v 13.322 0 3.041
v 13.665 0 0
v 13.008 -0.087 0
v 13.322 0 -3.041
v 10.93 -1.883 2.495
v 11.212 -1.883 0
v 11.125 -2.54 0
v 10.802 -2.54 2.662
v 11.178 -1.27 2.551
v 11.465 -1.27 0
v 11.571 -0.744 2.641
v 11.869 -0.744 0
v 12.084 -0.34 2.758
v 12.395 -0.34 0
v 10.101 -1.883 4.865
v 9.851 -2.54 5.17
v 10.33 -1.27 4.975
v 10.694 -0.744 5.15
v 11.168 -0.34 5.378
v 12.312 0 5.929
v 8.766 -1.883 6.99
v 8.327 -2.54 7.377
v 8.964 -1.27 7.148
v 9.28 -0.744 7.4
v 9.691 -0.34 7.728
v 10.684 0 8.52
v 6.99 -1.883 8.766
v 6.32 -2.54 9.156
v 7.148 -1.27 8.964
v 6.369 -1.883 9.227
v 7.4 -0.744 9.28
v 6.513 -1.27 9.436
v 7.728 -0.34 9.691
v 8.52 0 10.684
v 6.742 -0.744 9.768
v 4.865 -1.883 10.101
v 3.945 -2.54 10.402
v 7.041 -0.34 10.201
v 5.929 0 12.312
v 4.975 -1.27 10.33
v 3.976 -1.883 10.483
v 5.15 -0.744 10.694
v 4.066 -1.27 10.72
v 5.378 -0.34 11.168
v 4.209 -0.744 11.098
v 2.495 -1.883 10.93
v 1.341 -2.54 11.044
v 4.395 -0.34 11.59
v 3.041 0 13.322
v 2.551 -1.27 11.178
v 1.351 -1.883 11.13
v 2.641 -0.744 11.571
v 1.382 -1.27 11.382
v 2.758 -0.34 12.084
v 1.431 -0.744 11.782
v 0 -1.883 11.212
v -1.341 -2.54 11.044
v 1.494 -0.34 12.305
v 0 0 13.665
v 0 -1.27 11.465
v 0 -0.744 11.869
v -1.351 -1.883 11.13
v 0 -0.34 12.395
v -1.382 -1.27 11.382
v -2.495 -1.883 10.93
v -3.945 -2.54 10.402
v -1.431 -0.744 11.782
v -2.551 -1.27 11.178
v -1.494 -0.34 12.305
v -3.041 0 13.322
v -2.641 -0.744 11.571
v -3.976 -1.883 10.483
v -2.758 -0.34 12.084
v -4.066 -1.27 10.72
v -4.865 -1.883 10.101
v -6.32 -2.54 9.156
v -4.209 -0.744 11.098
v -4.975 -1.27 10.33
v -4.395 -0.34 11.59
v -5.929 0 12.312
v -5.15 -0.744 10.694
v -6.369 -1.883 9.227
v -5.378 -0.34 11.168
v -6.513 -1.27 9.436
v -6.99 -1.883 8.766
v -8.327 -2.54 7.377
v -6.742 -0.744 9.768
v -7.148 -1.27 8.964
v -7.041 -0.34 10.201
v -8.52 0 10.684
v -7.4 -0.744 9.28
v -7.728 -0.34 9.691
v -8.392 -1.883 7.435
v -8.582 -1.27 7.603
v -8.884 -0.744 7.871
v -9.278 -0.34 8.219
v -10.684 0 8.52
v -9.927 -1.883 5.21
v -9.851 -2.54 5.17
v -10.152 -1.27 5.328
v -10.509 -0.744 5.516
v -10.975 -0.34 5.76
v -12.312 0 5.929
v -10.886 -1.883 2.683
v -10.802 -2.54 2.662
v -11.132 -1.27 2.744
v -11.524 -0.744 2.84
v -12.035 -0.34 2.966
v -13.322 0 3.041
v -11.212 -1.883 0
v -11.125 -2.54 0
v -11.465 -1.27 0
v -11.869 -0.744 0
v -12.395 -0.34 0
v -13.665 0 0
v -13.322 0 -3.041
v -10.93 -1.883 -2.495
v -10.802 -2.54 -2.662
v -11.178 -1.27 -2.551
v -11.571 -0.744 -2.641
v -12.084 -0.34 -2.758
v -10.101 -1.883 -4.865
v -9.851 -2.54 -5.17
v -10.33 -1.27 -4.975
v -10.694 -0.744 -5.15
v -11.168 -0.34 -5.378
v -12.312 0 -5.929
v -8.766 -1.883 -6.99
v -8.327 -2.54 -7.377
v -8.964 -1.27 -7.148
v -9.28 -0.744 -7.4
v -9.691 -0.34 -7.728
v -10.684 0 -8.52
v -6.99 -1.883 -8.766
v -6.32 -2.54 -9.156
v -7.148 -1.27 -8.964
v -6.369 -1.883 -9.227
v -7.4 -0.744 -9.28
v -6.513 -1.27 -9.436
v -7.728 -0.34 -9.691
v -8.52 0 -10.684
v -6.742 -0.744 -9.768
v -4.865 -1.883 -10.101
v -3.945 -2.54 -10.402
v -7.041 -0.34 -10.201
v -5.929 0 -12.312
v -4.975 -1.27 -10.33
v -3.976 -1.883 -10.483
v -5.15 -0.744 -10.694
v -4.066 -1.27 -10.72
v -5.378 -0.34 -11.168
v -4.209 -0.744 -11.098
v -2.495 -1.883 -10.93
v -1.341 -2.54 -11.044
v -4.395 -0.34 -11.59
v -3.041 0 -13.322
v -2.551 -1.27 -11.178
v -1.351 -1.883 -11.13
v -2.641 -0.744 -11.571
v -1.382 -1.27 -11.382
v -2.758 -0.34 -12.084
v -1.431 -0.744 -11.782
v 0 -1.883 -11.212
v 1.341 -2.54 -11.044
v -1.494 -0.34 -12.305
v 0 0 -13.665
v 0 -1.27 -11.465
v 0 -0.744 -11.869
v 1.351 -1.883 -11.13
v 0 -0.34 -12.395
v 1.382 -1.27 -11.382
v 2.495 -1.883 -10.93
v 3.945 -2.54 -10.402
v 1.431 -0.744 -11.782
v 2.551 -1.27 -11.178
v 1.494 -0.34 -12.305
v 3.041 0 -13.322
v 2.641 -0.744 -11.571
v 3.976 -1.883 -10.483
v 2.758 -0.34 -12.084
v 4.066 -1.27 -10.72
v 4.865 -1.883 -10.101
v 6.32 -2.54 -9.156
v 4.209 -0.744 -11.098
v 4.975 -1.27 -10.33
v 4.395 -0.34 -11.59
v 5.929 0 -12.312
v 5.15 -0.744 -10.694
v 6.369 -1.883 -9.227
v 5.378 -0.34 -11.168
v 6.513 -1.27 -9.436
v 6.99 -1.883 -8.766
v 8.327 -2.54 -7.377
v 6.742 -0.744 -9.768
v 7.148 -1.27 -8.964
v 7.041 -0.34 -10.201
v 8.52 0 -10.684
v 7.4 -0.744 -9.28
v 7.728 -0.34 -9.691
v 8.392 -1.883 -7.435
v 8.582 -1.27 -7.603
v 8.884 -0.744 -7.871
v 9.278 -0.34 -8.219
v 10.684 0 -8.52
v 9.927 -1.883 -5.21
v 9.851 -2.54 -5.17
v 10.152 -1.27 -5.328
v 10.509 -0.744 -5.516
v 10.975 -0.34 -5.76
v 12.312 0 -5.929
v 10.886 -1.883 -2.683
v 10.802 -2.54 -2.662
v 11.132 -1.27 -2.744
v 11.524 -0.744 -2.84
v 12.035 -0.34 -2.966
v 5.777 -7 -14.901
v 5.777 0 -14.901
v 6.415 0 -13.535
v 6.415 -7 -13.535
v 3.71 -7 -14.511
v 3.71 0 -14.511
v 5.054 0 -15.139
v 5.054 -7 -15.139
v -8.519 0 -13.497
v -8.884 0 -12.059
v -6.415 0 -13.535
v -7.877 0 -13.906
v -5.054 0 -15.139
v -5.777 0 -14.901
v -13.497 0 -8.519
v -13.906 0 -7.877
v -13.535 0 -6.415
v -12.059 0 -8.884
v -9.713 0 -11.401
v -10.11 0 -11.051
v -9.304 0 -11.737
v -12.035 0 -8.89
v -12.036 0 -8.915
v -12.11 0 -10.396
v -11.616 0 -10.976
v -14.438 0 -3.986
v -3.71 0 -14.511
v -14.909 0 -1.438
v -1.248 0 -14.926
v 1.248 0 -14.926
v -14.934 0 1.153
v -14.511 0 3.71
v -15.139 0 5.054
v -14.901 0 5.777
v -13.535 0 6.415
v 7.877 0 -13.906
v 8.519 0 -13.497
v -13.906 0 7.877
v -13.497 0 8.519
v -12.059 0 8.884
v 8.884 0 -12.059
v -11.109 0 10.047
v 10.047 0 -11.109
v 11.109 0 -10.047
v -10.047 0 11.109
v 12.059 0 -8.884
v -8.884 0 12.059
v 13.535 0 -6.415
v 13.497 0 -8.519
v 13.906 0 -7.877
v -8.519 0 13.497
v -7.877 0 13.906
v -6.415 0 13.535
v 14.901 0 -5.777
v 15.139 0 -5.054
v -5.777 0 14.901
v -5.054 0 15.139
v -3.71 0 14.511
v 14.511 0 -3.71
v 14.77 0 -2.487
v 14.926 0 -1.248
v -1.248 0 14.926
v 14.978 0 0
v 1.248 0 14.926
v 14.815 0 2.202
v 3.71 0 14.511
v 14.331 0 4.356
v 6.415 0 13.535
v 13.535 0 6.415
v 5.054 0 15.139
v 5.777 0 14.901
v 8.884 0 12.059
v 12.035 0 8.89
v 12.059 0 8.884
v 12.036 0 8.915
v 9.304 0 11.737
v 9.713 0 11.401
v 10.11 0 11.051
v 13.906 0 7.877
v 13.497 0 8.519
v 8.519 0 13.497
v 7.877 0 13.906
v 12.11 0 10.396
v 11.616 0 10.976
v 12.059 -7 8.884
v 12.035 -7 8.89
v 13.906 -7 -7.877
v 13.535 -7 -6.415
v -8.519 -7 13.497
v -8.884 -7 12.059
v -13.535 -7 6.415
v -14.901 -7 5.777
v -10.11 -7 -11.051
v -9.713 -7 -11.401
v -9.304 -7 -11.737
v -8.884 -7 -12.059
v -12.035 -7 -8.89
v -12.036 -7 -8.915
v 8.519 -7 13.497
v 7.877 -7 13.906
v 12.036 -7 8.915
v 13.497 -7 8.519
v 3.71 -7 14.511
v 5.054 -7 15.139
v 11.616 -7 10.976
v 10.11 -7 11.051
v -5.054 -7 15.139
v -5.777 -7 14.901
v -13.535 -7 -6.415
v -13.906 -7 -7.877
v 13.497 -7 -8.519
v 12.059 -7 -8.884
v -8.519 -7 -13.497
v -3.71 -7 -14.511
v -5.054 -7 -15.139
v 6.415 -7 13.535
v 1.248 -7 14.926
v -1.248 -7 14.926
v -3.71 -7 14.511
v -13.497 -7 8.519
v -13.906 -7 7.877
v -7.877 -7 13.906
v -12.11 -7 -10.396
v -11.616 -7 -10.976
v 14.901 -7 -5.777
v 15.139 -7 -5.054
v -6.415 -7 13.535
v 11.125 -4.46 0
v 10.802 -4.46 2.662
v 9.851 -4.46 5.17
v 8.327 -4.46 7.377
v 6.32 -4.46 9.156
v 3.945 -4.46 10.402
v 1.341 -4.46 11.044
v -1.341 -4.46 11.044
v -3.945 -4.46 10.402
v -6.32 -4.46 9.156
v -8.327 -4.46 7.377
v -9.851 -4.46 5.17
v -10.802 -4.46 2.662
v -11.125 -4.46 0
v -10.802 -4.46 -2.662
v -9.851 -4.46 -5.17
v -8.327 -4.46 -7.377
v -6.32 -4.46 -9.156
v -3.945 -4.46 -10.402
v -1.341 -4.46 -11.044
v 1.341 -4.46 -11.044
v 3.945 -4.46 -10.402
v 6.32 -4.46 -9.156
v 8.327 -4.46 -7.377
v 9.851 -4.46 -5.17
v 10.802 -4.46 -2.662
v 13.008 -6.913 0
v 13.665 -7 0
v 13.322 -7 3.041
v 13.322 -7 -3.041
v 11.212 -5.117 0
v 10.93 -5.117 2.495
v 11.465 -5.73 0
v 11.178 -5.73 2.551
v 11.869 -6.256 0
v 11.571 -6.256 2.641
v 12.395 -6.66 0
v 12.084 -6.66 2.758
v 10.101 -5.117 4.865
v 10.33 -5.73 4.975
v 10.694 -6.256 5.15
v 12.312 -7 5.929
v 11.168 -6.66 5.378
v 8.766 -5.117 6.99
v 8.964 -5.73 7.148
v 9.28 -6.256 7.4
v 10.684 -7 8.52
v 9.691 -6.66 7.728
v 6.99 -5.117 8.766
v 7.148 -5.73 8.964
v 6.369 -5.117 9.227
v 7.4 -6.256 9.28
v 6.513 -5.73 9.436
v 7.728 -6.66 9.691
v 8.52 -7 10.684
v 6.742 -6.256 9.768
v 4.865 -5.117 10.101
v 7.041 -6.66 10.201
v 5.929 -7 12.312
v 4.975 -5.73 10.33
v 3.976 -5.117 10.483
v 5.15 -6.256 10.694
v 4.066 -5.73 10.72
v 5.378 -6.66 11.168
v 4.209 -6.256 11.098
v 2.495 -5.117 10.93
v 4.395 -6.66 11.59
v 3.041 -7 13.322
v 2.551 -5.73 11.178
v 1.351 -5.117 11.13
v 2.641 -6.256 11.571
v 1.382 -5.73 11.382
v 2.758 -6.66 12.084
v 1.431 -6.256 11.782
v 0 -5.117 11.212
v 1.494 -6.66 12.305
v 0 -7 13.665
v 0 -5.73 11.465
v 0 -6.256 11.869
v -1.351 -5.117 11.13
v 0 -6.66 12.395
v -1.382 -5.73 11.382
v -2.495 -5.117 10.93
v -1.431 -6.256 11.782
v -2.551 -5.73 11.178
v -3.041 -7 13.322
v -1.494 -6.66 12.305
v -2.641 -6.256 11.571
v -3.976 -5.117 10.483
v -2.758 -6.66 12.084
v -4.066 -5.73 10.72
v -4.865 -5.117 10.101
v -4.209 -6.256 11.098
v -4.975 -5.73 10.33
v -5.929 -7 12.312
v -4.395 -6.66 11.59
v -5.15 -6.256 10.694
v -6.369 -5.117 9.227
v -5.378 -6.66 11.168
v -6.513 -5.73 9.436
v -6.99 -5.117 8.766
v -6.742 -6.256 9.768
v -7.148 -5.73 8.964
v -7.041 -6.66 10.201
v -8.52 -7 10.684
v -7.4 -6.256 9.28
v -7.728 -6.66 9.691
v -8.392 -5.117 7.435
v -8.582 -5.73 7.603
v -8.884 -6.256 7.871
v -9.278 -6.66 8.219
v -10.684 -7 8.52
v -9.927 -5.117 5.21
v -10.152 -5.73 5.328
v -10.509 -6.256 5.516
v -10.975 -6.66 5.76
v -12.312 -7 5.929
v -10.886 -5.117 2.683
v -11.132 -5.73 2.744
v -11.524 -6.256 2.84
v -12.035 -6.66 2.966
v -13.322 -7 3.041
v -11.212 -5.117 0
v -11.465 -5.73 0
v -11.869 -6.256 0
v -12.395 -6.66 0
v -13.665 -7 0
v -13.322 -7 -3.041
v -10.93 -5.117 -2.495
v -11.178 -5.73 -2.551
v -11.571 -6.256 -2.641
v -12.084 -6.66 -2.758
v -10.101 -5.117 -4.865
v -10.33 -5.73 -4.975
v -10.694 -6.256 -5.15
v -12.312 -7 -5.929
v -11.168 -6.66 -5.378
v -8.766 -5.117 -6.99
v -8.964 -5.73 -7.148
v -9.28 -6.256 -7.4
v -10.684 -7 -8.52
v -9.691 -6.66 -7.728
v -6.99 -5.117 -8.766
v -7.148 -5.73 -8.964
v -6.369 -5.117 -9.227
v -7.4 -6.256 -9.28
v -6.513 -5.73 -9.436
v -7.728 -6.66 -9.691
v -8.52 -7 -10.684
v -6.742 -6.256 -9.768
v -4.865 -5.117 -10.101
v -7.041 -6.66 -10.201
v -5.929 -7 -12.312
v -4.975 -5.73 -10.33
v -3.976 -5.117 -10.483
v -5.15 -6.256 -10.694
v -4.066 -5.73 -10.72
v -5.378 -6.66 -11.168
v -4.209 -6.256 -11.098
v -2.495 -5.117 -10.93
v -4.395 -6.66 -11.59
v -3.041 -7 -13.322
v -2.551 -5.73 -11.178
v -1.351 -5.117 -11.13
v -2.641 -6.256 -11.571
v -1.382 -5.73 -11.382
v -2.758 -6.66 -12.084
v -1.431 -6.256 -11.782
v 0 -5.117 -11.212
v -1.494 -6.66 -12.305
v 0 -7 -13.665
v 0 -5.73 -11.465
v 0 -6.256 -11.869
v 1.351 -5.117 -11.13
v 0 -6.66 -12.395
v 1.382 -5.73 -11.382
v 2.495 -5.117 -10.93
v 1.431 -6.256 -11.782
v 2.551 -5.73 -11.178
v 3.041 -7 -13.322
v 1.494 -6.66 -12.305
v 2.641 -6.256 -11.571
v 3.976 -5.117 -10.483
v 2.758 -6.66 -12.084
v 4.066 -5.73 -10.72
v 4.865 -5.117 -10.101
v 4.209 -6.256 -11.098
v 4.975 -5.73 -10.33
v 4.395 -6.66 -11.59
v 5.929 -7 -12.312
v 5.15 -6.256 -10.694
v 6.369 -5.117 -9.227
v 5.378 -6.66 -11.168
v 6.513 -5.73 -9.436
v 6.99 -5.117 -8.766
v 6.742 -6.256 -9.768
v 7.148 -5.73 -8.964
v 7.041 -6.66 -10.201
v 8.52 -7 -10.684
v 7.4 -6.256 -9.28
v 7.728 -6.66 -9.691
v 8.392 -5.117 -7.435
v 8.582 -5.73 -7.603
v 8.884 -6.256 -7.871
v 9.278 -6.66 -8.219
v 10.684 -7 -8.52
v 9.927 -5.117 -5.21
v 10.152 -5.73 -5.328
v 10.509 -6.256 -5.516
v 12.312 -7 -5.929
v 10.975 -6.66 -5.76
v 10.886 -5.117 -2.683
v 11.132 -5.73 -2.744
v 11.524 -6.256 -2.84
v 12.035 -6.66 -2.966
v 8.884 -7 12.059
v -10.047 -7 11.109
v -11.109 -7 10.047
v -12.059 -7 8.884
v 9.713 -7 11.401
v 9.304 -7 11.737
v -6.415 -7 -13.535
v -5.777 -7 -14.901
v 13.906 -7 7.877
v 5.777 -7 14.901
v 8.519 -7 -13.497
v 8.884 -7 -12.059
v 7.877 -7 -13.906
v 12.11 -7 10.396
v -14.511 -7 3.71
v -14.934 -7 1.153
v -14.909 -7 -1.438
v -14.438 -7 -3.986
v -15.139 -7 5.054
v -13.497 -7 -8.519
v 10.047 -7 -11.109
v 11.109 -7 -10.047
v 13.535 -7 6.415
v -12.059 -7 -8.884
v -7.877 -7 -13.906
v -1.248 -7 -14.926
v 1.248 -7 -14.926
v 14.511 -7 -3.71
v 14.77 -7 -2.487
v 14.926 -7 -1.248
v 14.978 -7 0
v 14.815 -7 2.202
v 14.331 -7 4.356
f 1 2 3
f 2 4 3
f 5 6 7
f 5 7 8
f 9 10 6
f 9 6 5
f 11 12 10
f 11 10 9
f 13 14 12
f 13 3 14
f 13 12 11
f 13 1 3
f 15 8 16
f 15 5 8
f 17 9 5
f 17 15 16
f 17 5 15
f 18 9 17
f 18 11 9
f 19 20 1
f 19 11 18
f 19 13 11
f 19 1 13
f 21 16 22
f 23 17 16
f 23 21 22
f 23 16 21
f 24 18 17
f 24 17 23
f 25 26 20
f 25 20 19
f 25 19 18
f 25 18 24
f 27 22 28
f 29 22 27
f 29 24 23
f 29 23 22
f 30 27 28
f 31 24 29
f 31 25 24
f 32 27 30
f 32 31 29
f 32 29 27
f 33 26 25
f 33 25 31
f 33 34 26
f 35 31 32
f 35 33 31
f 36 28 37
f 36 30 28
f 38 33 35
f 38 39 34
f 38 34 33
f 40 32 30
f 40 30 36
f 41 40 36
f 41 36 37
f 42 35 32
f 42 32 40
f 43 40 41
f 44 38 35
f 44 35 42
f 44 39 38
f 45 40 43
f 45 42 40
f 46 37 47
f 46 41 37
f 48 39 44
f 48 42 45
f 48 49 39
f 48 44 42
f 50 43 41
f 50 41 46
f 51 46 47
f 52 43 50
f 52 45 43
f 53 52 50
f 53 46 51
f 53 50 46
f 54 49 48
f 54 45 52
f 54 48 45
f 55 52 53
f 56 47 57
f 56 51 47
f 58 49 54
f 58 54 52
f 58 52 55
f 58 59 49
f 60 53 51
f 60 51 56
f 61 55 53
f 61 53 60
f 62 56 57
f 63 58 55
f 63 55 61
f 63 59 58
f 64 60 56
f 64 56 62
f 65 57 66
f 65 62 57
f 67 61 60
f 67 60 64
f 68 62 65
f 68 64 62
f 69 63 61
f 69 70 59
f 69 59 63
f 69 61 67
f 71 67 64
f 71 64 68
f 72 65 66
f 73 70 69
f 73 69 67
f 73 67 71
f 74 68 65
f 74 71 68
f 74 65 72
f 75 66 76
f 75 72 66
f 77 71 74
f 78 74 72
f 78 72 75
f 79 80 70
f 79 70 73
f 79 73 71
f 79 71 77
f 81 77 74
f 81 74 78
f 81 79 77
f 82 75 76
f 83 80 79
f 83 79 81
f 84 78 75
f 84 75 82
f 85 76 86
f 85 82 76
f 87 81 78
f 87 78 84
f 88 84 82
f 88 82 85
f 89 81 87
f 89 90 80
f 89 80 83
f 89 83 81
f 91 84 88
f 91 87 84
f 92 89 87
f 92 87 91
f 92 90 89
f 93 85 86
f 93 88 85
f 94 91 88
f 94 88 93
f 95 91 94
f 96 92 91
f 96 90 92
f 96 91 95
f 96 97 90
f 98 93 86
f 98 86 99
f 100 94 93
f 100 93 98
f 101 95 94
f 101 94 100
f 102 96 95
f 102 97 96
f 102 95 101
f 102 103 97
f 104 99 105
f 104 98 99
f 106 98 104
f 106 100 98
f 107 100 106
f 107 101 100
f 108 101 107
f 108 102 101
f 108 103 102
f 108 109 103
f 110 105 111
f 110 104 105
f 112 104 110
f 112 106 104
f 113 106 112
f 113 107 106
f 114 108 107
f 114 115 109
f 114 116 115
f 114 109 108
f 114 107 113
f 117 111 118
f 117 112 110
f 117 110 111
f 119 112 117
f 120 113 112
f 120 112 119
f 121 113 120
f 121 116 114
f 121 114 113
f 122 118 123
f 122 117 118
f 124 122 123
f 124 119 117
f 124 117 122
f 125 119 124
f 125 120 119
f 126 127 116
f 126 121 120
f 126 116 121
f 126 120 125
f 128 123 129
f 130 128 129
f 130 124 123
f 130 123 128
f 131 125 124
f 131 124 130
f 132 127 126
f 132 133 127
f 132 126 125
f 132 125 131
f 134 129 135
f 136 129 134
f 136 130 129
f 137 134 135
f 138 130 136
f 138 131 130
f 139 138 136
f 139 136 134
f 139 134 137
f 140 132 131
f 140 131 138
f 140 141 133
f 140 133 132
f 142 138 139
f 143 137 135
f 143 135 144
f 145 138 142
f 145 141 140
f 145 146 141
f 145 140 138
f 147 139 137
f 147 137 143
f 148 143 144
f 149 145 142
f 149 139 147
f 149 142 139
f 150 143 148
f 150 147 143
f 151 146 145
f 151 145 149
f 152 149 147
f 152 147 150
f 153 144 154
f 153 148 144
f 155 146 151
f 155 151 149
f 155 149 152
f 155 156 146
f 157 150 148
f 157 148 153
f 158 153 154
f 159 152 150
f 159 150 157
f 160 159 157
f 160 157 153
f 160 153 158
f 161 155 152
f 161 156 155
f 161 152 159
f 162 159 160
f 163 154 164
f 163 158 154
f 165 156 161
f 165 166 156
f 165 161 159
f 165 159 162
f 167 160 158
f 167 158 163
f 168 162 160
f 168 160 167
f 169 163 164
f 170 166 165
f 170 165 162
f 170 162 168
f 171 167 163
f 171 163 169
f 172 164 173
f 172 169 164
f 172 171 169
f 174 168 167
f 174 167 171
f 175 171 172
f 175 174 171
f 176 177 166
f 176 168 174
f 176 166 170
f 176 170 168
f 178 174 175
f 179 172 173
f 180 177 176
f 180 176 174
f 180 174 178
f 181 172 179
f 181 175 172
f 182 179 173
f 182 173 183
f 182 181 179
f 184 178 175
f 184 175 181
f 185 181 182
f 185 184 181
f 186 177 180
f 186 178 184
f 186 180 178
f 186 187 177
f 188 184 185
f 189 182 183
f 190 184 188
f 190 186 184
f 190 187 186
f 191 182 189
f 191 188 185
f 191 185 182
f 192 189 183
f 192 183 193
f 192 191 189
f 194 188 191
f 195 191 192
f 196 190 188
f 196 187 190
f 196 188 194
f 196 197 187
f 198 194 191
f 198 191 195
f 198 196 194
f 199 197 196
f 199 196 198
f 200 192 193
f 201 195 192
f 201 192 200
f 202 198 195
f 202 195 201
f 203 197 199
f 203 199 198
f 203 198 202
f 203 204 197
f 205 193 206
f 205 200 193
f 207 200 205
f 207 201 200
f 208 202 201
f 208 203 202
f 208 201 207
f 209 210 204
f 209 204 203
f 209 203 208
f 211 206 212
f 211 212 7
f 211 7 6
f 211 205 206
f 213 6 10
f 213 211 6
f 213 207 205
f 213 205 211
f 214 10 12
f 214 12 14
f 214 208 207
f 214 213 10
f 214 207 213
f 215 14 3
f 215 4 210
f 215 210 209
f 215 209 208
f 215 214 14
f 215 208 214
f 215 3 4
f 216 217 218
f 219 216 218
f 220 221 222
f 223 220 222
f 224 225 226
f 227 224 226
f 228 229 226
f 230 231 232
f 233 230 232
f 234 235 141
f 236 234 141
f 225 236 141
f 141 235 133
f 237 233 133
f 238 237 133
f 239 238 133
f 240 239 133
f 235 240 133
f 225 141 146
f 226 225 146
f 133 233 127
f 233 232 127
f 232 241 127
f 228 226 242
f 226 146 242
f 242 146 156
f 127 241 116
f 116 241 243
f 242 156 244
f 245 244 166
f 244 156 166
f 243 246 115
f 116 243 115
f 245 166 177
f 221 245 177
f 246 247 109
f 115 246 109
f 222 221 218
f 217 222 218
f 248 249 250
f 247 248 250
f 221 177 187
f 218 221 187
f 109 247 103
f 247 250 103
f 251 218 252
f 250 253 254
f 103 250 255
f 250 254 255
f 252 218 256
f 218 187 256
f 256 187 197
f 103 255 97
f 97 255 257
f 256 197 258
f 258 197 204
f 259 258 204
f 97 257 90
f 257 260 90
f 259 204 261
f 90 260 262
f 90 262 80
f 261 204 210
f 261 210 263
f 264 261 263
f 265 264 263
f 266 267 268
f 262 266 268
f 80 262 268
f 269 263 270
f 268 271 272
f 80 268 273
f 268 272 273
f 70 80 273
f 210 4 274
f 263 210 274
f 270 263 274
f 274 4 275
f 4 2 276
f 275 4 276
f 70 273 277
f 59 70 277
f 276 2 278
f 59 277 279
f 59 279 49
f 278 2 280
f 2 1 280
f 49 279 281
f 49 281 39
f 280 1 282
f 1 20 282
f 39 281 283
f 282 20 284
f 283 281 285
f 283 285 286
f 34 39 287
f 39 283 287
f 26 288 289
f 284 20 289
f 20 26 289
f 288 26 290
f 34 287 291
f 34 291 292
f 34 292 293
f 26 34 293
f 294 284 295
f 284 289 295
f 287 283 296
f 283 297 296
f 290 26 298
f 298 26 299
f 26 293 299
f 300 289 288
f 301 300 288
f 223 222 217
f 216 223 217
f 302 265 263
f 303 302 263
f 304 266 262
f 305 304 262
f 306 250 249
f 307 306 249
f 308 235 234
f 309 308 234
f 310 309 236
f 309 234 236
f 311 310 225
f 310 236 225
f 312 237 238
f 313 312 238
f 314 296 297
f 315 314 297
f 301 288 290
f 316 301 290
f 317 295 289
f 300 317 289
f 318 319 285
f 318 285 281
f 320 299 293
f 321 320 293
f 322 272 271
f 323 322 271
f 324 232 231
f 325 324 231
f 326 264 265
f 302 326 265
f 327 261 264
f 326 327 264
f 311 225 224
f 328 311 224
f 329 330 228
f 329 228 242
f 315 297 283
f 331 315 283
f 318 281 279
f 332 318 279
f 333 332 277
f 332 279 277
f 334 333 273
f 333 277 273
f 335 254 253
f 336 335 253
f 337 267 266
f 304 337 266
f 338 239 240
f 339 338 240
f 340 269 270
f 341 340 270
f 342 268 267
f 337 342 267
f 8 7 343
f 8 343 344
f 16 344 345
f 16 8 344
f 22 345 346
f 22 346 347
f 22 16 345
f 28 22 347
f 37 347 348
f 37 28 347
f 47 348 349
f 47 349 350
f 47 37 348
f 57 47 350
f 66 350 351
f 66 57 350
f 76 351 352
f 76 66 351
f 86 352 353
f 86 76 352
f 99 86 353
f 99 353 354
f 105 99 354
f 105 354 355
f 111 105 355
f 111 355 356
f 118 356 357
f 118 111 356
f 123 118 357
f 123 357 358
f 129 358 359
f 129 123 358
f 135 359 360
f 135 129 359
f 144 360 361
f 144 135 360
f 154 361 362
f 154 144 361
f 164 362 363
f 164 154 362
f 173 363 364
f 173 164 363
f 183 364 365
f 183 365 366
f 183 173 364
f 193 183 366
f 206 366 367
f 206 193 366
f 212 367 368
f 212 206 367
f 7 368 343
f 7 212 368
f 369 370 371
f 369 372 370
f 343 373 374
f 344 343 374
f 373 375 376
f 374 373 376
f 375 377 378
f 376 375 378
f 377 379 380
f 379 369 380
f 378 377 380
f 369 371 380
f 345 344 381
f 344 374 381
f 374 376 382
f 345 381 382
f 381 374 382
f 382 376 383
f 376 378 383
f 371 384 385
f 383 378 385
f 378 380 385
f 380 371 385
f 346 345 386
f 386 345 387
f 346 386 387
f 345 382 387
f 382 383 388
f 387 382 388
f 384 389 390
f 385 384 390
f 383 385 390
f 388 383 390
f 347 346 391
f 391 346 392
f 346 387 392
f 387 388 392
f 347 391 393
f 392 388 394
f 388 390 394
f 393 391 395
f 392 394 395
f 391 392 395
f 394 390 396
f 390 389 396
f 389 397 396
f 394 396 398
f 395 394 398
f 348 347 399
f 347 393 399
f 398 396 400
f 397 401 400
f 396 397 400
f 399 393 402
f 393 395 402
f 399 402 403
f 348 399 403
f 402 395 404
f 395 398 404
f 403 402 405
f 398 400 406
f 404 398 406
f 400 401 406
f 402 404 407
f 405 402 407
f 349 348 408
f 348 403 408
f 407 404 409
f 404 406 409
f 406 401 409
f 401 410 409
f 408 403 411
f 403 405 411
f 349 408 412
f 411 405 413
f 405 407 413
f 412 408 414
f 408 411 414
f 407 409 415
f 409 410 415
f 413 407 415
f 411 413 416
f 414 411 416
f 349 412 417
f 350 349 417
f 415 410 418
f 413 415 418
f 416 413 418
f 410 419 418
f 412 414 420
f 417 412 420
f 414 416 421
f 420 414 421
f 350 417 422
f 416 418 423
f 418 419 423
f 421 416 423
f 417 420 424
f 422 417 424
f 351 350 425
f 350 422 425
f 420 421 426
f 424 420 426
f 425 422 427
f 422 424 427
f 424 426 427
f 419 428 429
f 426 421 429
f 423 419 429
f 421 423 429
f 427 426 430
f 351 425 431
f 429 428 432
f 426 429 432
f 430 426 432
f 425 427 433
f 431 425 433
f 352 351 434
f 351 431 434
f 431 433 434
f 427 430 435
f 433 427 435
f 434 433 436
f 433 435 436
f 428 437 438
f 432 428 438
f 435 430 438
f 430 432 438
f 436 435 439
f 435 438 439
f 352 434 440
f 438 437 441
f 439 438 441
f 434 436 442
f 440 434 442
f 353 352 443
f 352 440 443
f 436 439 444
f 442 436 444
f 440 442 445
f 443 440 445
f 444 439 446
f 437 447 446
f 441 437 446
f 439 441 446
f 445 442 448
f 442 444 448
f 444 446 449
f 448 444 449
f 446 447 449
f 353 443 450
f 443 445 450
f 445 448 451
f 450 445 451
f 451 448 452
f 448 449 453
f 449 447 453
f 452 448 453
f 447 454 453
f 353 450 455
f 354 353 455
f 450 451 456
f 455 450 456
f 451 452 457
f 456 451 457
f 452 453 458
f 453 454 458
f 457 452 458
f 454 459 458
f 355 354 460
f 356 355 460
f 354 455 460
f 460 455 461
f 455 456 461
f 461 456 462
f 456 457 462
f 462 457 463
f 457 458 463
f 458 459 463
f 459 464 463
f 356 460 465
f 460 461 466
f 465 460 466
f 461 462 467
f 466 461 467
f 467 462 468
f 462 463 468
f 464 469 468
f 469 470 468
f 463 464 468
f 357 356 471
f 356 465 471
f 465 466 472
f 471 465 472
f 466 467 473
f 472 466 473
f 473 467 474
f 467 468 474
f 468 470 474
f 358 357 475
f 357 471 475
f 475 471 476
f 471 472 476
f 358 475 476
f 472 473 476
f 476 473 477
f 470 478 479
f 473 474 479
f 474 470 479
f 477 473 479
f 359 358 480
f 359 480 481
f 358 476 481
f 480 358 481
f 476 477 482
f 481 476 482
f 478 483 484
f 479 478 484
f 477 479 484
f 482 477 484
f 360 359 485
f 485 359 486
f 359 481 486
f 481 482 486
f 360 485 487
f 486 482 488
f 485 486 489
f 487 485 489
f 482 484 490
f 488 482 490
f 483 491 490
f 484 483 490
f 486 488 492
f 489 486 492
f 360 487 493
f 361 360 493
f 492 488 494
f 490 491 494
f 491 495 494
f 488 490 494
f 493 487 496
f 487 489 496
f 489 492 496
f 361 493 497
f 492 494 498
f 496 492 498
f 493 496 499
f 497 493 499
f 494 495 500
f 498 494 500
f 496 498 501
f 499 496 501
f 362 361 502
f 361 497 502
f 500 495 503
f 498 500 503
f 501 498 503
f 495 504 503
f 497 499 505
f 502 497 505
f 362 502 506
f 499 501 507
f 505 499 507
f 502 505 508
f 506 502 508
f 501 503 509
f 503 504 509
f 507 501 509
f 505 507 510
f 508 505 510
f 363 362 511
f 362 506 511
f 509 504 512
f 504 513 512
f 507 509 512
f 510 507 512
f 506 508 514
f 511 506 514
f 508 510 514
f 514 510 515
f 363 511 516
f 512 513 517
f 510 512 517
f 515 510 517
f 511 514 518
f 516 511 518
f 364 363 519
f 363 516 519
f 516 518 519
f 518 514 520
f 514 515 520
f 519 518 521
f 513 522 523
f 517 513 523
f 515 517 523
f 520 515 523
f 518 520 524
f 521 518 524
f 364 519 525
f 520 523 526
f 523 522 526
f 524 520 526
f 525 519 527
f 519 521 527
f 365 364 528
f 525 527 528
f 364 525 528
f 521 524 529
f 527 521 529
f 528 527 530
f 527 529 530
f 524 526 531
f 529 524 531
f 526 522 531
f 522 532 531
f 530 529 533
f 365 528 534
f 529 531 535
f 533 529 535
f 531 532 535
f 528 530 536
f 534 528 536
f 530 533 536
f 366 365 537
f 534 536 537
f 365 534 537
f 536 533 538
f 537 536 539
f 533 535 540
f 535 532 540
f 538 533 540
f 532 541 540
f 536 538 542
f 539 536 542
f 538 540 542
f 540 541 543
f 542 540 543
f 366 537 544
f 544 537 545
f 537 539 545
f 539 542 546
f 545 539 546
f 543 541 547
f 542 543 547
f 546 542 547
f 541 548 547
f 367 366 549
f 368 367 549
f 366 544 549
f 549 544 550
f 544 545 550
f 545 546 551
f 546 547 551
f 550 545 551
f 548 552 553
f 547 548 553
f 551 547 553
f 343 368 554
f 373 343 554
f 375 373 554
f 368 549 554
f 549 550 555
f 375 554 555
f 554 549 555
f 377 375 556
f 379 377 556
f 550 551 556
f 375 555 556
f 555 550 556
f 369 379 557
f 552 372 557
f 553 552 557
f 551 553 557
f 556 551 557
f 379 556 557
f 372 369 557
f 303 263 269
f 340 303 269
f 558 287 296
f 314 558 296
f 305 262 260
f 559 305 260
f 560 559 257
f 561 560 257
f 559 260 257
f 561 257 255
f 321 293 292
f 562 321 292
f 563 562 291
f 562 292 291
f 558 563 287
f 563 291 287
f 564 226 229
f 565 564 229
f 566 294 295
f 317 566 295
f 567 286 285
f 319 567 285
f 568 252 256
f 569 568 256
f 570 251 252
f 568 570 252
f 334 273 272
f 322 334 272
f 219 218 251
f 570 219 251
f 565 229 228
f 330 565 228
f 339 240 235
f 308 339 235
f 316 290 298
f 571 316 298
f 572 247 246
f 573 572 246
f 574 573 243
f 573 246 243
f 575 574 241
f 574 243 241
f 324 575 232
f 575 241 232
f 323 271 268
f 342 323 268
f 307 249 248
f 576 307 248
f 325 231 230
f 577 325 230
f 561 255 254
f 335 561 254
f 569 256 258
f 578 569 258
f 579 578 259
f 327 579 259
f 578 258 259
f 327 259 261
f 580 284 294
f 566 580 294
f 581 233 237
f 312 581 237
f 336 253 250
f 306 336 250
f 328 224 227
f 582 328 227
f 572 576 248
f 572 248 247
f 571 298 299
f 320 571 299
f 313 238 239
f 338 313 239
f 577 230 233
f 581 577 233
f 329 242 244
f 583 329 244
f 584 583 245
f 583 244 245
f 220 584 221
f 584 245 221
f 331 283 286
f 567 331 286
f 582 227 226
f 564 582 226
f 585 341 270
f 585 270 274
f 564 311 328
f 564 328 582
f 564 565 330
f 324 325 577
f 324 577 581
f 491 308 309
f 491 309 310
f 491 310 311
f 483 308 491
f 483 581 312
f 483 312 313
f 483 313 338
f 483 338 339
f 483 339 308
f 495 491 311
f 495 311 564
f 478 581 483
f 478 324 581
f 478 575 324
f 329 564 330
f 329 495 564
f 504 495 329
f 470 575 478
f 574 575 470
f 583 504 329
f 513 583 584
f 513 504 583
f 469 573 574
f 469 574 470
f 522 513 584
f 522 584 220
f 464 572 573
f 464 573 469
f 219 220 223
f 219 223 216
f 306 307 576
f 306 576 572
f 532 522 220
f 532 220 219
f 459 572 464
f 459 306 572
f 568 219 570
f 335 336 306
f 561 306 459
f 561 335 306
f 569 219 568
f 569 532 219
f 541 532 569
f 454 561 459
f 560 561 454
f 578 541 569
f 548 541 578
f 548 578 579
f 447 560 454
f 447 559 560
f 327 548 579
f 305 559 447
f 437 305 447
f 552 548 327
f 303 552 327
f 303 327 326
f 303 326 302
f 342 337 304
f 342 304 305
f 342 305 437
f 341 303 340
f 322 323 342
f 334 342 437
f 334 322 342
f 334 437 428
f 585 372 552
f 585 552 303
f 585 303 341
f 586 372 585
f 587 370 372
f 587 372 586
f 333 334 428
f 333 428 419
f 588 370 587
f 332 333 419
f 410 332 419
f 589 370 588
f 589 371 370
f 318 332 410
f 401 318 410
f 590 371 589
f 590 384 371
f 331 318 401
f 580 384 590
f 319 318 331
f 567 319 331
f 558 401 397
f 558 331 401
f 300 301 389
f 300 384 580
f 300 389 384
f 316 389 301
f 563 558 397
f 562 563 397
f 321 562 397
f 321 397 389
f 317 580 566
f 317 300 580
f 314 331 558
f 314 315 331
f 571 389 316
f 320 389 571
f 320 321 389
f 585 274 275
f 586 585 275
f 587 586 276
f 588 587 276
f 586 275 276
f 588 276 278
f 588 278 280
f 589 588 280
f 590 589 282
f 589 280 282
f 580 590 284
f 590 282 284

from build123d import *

# Parameters (mm, degrees)
F0_R     = 11.125
F1_DEPTH = 7
F2_R     = 2.54


with BuildPart() as f1:
    # F0 (on Front) → F1 (new body)
    with BuildSketch(Plane.XZ):
        with BuildLine():
            ThreePointArc((14.511314, -3.709508), (14.860825, -1.869371), (14.97794, 0))
            ThreePointArc((14.97794, 0), (14.612658, 3.28769), (13.53463, 6.415019))
            ThreePointArc((13.53463, 6.415019), (12.856111, 7.684991), (12.058783, 8.883942))
            Line((12.058783, 8.883942), (12.034945, 8.889992))
            Line((12.034945, 8.889992), (12.03617, 8.914555))
            ThreePointArc((12.03617, 8.914555), (11.124567, 10.029093), (10.110156, 11.050947))
            ThreePointArc((10.110156, 11.050947), (9.510409, 11.57112), (8.883942, 12.058783))
            ThreePointArc((8.883942, 12.058783), (7.684991, 12.856111), (6.415019, 13.53463))
            ThreePointArc((6.415019, 13.53463), (5.085764, 14.088069), (3.709508, 14.511314))
            ThreePointArc((3.709508, 14.511314), (0, 14.97794), (-3.709508, 14.511314))
            ThreePointArc((-3.709508, 14.511314), (-5.085764, 14.088069), (-6.415019, 13.53463))
            ThreePointArc((-6.415019, 13.53463), (-7.684991, 12.856111), (-8.883942, 12.058783))
            ThreePointArc((-8.883942, 12.058783), (-10.591003, 10.591003), (-12.058783, 8.883942))
            ThreePointArc((-12.058783, 8.883942), (-12.856111, 7.684991), (-13.53463, 6.415019))
            ThreePointArc((-13.53463, 6.415019), (-14.088069, 5.085764), (-14.511314, 3.709508))
            ThreePointArc((-14.511314, 3.709508), (-14.908731, -1.438202), (-13.53463, -6.415019))
            ThreePointArc((-13.53463, -6.415019), (-12.856111, -7.684991), (-12.058783, -8.883942))
            Line((-12.058783, -8.883942), (-12.034945, -8.889992))
            Line((-12.034945, -8.889992), (-12.03617, -8.914555))
            ThreePointArc((-12.03617, -8.914555), (-11.124567, -10.029093), (-10.110156, -11.050947))
            ThreePointArc((-10.110156, -11.050947), (-9.510409, -11.57112), (-8.883942, -12.058783))
            ThreePointArc((-8.883942, -12.058783), (-7.684991, -12.856111), (-6.415019, -13.53463))
            ThreePointArc((-6.415019, -13.53463), (-5.085764, -14.088069), (-3.709508, -14.511314))
            ThreePointArc((-3.709508, -14.511314), (0, -14.97794), (3.709508, -14.511314))
            ThreePointArc((3.709508, -14.511314), (5.085764, -14.088069), (6.415019, -13.53463))
            ThreePointArc((6.415019, -13.53463), (7.684991, -12.856111), (8.883942, -12.058783))
            ThreePointArc((8.883942, -12.058783), (10.591003, -10.591003), (12.058783, -8.883942))
            ThreePointArc((12.058783, -8.883942), (12.856111, -7.684991), (13.53463, -6.415019))
            ThreePointArc((13.53463, -6.415019), (14.088069, -5.085764), (14.511314, -3.709508))
        make_face()
        Circle(F0_R, mode=Mode.SUBTRACT)
        with BuildLine():
            Line((-11.6164, -10.975811), (-10.110156, -11.050947))
            ThreePointArc((-10.110156, -11.050947), (-11.124567, -10.029093), (-12.03617, -8.914555))
            Line((-12.03617, -8.914555), (-12.110081, -10.396236))
            Line((-12.110081, -10.396236), (-11.6164, -10.975811))
        make_face()
        with BuildLine():
            Line((-13.49673, -8.519042), (-12.058783, -8.883942))
            ThreePointArc((-12.058783, -8.883942), (-12.856111, -7.684991), (-13.53463, -6.415019))
            Line((-13.53463, -6.415019), (-13.905579, -7.876804))
            Line((-13.905579, -7.876804), (-13.49673, -8.519042))
        make_face()
        with BuildLine():
            Line((-7.876804, -13.905579), (-6.415019, -13.53463))
            ThreePointArc((-6.415019, -13.53463), (-7.684991, -12.856111), (-8.883942, -12.058783))
            Line((-8.883942, -12.058783), (-8.519042, -13.49673))
            Line((-8.519042, -13.49673), (-7.876804, -13.905579))
        make_face()
        with BuildLine():
            Line((-5.05358, -15.139258), (-3.709508, -14.511314))
            ThreePointArc((-3.709508, -14.511314), (-5.085764, -14.088069), (-6.415019, -13.53463))
            Line((-6.415019, -13.53463), (-5.776666, -14.900984))
            Line((-5.776666, -14.900984), (-5.05358, -15.139258))
        make_face()
        with BuildLine():
            Line((5.776666, -14.900984), (6.415019, -13.53463))
            ThreePointArc((6.415019, -13.53463), (5.085764, -14.088069), (3.709508, -14.511314))
            Line((3.709508, -14.511314), (5.05358, -15.139258))
            Line((5.05358, -15.139258), (5.776666, -14.900984))
        make_face()
        with BuildLine():
            Line((8.519042, -13.49673), (8.883942, -12.058783))
            ThreePointArc((8.883942, -12.058783), (7.684991, -12.856111), (6.415019, -13.53463))
            Line((6.415019, -13.53463), (7.876804, -13.905579))
            Line((7.876804, -13.905579), (8.519042, -13.49673))
        make_face()
        with BuildLine():
            Line((13.905579, -7.876804), (13.53463, -6.415019))
            ThreePointArc((13.53463, -6.415019), (12.856111, -7.684991), (12.058783, -8.883942))
            Line((12.058783, -8.883942), (13.49673, -8.519042))
            Line((13.49673, -8.519042), (13.905579, -7.876804))
        make_face()
        with BuildLine():
            Line((15.139258, -5.05358), (14.511314, -3.709508))
            ThreePointArc((14.511314, -3.709508), (14.088069, -5.085764), (13.53463, -6.415019))
            Line((13.53463, -6.415019), (14.900984, -5.776666))
            Line((14.900984, -5.776666), (15.139258, -5.05358))
        make_face()
        with BuildLine():
            ThreePointArc((-14.511314, 3.709508), (-14.088069, 5.085764), (-13.53463, 6.415019))
            Line((-13.53463, 6.415019), (-14.900984, 5.776666))
            Line((-14.900984, 5.776666), (-15.139258, 5.05358))
            Line((-15.139258, 5.05358), (-14.511314, 3.709508))
        make_face()
        with BuildLine():
            ThreePointArc((-13.53463, 6.415019), (-12.856111, 7.684991), (-12.058783, 8.883942))
            Line((-12.058783, 8.883942), (-13.49673, 8.519042))
            Line((-13.49673, 8.519042), (-13.905579, 7.876804))
            Line((-13.905579, 7.876804), (-13.53463, 6.415019))
        make_face()
        with BuildLine():
            ThreePointArc((12.058783, 8.883942), (12.856111, 7.684991), (13.53463, 6.415019))
            Line((13.53463, 6.415019), (13.905579, 7.876804))
            Line((13.905579, 7.876804), (13.49673, 8.519042))
            Line((13.49673, 8.519042), (12.058783, 8.883942))
        make_face()
        with BuildLine():
            ThreePointArc((10.110156, 11.050947), (11.124567, 10.029093), (12.03617, 8.914555))
            Line((12.03617, 8.914555), (12.110081, 10.396236))
            Line((12.110081, 10.396236), (11.6164, 10.975811))
            Line((11.6164, 10.975811), (10.110156, 11.050947))
        make_face()
        with BuildLine():
            ThreePointArc((6.415019, 13.53463), (7.684991, 12.856111), (8.883942, 12.058783))
            Line((8.883942, 12.058783), (8.519042, 13.49673))
            Line((8.519042, 13.49673), (7.876804, 13.905579))
            Line((7.876804, 13.905579), (6.415019, 13.53463))
        make_face()
        with BuildLine():
            ThreePointArc((3.709508, 14.511314), (5.085764, 14.088069), (6.415019, 13.53463))
            Line((6.415019, 13.53463), (5.776666, 14.900984))
            Line((5.776666, 14.900984), (5.05358, 15.139258))
            Line((5.05358, 15.139258), (3.709508, 14.511314))
        make_face()
        with BuildLine():
            ThreePointArc((-6.415019, 13.53463), (-5.085764, 14.088069), (-3.709508, 14.511314))
            Line((-3.709508, 14.511314), (-5.05358, 15.139258))
            Line((-5.05358, 15.139258), (-5.776666, 14.900984))
            Line((-5.776666, 14.900984), (-6.415019, 13.53463))
        make_face()
        with BuildLine():
            ThreePointArc((-8.883942, 12.058783), (-7.684991, 12.856111), (-6.415019, 13.53463))
            Line((-6.415019, 13.53463), (-7.876804, 13.905579))
            Line((-7.876804, 13.905579), (-8.519042, 13.49673))
            Line((-8.519042, 13.49673), (-8.883942, 12.058783))
        make_face()
    extrude(amount=F1_DEPTH)

    # F2
    f2_edges = [f1.edges().sort_by_distance(p)[0] for p in [
        (-11.125, -7, 0),
        (-11.125, 0, 0),
    ]]
    fillet(f2_edges, radius=F2_R)


solid = f1.part
